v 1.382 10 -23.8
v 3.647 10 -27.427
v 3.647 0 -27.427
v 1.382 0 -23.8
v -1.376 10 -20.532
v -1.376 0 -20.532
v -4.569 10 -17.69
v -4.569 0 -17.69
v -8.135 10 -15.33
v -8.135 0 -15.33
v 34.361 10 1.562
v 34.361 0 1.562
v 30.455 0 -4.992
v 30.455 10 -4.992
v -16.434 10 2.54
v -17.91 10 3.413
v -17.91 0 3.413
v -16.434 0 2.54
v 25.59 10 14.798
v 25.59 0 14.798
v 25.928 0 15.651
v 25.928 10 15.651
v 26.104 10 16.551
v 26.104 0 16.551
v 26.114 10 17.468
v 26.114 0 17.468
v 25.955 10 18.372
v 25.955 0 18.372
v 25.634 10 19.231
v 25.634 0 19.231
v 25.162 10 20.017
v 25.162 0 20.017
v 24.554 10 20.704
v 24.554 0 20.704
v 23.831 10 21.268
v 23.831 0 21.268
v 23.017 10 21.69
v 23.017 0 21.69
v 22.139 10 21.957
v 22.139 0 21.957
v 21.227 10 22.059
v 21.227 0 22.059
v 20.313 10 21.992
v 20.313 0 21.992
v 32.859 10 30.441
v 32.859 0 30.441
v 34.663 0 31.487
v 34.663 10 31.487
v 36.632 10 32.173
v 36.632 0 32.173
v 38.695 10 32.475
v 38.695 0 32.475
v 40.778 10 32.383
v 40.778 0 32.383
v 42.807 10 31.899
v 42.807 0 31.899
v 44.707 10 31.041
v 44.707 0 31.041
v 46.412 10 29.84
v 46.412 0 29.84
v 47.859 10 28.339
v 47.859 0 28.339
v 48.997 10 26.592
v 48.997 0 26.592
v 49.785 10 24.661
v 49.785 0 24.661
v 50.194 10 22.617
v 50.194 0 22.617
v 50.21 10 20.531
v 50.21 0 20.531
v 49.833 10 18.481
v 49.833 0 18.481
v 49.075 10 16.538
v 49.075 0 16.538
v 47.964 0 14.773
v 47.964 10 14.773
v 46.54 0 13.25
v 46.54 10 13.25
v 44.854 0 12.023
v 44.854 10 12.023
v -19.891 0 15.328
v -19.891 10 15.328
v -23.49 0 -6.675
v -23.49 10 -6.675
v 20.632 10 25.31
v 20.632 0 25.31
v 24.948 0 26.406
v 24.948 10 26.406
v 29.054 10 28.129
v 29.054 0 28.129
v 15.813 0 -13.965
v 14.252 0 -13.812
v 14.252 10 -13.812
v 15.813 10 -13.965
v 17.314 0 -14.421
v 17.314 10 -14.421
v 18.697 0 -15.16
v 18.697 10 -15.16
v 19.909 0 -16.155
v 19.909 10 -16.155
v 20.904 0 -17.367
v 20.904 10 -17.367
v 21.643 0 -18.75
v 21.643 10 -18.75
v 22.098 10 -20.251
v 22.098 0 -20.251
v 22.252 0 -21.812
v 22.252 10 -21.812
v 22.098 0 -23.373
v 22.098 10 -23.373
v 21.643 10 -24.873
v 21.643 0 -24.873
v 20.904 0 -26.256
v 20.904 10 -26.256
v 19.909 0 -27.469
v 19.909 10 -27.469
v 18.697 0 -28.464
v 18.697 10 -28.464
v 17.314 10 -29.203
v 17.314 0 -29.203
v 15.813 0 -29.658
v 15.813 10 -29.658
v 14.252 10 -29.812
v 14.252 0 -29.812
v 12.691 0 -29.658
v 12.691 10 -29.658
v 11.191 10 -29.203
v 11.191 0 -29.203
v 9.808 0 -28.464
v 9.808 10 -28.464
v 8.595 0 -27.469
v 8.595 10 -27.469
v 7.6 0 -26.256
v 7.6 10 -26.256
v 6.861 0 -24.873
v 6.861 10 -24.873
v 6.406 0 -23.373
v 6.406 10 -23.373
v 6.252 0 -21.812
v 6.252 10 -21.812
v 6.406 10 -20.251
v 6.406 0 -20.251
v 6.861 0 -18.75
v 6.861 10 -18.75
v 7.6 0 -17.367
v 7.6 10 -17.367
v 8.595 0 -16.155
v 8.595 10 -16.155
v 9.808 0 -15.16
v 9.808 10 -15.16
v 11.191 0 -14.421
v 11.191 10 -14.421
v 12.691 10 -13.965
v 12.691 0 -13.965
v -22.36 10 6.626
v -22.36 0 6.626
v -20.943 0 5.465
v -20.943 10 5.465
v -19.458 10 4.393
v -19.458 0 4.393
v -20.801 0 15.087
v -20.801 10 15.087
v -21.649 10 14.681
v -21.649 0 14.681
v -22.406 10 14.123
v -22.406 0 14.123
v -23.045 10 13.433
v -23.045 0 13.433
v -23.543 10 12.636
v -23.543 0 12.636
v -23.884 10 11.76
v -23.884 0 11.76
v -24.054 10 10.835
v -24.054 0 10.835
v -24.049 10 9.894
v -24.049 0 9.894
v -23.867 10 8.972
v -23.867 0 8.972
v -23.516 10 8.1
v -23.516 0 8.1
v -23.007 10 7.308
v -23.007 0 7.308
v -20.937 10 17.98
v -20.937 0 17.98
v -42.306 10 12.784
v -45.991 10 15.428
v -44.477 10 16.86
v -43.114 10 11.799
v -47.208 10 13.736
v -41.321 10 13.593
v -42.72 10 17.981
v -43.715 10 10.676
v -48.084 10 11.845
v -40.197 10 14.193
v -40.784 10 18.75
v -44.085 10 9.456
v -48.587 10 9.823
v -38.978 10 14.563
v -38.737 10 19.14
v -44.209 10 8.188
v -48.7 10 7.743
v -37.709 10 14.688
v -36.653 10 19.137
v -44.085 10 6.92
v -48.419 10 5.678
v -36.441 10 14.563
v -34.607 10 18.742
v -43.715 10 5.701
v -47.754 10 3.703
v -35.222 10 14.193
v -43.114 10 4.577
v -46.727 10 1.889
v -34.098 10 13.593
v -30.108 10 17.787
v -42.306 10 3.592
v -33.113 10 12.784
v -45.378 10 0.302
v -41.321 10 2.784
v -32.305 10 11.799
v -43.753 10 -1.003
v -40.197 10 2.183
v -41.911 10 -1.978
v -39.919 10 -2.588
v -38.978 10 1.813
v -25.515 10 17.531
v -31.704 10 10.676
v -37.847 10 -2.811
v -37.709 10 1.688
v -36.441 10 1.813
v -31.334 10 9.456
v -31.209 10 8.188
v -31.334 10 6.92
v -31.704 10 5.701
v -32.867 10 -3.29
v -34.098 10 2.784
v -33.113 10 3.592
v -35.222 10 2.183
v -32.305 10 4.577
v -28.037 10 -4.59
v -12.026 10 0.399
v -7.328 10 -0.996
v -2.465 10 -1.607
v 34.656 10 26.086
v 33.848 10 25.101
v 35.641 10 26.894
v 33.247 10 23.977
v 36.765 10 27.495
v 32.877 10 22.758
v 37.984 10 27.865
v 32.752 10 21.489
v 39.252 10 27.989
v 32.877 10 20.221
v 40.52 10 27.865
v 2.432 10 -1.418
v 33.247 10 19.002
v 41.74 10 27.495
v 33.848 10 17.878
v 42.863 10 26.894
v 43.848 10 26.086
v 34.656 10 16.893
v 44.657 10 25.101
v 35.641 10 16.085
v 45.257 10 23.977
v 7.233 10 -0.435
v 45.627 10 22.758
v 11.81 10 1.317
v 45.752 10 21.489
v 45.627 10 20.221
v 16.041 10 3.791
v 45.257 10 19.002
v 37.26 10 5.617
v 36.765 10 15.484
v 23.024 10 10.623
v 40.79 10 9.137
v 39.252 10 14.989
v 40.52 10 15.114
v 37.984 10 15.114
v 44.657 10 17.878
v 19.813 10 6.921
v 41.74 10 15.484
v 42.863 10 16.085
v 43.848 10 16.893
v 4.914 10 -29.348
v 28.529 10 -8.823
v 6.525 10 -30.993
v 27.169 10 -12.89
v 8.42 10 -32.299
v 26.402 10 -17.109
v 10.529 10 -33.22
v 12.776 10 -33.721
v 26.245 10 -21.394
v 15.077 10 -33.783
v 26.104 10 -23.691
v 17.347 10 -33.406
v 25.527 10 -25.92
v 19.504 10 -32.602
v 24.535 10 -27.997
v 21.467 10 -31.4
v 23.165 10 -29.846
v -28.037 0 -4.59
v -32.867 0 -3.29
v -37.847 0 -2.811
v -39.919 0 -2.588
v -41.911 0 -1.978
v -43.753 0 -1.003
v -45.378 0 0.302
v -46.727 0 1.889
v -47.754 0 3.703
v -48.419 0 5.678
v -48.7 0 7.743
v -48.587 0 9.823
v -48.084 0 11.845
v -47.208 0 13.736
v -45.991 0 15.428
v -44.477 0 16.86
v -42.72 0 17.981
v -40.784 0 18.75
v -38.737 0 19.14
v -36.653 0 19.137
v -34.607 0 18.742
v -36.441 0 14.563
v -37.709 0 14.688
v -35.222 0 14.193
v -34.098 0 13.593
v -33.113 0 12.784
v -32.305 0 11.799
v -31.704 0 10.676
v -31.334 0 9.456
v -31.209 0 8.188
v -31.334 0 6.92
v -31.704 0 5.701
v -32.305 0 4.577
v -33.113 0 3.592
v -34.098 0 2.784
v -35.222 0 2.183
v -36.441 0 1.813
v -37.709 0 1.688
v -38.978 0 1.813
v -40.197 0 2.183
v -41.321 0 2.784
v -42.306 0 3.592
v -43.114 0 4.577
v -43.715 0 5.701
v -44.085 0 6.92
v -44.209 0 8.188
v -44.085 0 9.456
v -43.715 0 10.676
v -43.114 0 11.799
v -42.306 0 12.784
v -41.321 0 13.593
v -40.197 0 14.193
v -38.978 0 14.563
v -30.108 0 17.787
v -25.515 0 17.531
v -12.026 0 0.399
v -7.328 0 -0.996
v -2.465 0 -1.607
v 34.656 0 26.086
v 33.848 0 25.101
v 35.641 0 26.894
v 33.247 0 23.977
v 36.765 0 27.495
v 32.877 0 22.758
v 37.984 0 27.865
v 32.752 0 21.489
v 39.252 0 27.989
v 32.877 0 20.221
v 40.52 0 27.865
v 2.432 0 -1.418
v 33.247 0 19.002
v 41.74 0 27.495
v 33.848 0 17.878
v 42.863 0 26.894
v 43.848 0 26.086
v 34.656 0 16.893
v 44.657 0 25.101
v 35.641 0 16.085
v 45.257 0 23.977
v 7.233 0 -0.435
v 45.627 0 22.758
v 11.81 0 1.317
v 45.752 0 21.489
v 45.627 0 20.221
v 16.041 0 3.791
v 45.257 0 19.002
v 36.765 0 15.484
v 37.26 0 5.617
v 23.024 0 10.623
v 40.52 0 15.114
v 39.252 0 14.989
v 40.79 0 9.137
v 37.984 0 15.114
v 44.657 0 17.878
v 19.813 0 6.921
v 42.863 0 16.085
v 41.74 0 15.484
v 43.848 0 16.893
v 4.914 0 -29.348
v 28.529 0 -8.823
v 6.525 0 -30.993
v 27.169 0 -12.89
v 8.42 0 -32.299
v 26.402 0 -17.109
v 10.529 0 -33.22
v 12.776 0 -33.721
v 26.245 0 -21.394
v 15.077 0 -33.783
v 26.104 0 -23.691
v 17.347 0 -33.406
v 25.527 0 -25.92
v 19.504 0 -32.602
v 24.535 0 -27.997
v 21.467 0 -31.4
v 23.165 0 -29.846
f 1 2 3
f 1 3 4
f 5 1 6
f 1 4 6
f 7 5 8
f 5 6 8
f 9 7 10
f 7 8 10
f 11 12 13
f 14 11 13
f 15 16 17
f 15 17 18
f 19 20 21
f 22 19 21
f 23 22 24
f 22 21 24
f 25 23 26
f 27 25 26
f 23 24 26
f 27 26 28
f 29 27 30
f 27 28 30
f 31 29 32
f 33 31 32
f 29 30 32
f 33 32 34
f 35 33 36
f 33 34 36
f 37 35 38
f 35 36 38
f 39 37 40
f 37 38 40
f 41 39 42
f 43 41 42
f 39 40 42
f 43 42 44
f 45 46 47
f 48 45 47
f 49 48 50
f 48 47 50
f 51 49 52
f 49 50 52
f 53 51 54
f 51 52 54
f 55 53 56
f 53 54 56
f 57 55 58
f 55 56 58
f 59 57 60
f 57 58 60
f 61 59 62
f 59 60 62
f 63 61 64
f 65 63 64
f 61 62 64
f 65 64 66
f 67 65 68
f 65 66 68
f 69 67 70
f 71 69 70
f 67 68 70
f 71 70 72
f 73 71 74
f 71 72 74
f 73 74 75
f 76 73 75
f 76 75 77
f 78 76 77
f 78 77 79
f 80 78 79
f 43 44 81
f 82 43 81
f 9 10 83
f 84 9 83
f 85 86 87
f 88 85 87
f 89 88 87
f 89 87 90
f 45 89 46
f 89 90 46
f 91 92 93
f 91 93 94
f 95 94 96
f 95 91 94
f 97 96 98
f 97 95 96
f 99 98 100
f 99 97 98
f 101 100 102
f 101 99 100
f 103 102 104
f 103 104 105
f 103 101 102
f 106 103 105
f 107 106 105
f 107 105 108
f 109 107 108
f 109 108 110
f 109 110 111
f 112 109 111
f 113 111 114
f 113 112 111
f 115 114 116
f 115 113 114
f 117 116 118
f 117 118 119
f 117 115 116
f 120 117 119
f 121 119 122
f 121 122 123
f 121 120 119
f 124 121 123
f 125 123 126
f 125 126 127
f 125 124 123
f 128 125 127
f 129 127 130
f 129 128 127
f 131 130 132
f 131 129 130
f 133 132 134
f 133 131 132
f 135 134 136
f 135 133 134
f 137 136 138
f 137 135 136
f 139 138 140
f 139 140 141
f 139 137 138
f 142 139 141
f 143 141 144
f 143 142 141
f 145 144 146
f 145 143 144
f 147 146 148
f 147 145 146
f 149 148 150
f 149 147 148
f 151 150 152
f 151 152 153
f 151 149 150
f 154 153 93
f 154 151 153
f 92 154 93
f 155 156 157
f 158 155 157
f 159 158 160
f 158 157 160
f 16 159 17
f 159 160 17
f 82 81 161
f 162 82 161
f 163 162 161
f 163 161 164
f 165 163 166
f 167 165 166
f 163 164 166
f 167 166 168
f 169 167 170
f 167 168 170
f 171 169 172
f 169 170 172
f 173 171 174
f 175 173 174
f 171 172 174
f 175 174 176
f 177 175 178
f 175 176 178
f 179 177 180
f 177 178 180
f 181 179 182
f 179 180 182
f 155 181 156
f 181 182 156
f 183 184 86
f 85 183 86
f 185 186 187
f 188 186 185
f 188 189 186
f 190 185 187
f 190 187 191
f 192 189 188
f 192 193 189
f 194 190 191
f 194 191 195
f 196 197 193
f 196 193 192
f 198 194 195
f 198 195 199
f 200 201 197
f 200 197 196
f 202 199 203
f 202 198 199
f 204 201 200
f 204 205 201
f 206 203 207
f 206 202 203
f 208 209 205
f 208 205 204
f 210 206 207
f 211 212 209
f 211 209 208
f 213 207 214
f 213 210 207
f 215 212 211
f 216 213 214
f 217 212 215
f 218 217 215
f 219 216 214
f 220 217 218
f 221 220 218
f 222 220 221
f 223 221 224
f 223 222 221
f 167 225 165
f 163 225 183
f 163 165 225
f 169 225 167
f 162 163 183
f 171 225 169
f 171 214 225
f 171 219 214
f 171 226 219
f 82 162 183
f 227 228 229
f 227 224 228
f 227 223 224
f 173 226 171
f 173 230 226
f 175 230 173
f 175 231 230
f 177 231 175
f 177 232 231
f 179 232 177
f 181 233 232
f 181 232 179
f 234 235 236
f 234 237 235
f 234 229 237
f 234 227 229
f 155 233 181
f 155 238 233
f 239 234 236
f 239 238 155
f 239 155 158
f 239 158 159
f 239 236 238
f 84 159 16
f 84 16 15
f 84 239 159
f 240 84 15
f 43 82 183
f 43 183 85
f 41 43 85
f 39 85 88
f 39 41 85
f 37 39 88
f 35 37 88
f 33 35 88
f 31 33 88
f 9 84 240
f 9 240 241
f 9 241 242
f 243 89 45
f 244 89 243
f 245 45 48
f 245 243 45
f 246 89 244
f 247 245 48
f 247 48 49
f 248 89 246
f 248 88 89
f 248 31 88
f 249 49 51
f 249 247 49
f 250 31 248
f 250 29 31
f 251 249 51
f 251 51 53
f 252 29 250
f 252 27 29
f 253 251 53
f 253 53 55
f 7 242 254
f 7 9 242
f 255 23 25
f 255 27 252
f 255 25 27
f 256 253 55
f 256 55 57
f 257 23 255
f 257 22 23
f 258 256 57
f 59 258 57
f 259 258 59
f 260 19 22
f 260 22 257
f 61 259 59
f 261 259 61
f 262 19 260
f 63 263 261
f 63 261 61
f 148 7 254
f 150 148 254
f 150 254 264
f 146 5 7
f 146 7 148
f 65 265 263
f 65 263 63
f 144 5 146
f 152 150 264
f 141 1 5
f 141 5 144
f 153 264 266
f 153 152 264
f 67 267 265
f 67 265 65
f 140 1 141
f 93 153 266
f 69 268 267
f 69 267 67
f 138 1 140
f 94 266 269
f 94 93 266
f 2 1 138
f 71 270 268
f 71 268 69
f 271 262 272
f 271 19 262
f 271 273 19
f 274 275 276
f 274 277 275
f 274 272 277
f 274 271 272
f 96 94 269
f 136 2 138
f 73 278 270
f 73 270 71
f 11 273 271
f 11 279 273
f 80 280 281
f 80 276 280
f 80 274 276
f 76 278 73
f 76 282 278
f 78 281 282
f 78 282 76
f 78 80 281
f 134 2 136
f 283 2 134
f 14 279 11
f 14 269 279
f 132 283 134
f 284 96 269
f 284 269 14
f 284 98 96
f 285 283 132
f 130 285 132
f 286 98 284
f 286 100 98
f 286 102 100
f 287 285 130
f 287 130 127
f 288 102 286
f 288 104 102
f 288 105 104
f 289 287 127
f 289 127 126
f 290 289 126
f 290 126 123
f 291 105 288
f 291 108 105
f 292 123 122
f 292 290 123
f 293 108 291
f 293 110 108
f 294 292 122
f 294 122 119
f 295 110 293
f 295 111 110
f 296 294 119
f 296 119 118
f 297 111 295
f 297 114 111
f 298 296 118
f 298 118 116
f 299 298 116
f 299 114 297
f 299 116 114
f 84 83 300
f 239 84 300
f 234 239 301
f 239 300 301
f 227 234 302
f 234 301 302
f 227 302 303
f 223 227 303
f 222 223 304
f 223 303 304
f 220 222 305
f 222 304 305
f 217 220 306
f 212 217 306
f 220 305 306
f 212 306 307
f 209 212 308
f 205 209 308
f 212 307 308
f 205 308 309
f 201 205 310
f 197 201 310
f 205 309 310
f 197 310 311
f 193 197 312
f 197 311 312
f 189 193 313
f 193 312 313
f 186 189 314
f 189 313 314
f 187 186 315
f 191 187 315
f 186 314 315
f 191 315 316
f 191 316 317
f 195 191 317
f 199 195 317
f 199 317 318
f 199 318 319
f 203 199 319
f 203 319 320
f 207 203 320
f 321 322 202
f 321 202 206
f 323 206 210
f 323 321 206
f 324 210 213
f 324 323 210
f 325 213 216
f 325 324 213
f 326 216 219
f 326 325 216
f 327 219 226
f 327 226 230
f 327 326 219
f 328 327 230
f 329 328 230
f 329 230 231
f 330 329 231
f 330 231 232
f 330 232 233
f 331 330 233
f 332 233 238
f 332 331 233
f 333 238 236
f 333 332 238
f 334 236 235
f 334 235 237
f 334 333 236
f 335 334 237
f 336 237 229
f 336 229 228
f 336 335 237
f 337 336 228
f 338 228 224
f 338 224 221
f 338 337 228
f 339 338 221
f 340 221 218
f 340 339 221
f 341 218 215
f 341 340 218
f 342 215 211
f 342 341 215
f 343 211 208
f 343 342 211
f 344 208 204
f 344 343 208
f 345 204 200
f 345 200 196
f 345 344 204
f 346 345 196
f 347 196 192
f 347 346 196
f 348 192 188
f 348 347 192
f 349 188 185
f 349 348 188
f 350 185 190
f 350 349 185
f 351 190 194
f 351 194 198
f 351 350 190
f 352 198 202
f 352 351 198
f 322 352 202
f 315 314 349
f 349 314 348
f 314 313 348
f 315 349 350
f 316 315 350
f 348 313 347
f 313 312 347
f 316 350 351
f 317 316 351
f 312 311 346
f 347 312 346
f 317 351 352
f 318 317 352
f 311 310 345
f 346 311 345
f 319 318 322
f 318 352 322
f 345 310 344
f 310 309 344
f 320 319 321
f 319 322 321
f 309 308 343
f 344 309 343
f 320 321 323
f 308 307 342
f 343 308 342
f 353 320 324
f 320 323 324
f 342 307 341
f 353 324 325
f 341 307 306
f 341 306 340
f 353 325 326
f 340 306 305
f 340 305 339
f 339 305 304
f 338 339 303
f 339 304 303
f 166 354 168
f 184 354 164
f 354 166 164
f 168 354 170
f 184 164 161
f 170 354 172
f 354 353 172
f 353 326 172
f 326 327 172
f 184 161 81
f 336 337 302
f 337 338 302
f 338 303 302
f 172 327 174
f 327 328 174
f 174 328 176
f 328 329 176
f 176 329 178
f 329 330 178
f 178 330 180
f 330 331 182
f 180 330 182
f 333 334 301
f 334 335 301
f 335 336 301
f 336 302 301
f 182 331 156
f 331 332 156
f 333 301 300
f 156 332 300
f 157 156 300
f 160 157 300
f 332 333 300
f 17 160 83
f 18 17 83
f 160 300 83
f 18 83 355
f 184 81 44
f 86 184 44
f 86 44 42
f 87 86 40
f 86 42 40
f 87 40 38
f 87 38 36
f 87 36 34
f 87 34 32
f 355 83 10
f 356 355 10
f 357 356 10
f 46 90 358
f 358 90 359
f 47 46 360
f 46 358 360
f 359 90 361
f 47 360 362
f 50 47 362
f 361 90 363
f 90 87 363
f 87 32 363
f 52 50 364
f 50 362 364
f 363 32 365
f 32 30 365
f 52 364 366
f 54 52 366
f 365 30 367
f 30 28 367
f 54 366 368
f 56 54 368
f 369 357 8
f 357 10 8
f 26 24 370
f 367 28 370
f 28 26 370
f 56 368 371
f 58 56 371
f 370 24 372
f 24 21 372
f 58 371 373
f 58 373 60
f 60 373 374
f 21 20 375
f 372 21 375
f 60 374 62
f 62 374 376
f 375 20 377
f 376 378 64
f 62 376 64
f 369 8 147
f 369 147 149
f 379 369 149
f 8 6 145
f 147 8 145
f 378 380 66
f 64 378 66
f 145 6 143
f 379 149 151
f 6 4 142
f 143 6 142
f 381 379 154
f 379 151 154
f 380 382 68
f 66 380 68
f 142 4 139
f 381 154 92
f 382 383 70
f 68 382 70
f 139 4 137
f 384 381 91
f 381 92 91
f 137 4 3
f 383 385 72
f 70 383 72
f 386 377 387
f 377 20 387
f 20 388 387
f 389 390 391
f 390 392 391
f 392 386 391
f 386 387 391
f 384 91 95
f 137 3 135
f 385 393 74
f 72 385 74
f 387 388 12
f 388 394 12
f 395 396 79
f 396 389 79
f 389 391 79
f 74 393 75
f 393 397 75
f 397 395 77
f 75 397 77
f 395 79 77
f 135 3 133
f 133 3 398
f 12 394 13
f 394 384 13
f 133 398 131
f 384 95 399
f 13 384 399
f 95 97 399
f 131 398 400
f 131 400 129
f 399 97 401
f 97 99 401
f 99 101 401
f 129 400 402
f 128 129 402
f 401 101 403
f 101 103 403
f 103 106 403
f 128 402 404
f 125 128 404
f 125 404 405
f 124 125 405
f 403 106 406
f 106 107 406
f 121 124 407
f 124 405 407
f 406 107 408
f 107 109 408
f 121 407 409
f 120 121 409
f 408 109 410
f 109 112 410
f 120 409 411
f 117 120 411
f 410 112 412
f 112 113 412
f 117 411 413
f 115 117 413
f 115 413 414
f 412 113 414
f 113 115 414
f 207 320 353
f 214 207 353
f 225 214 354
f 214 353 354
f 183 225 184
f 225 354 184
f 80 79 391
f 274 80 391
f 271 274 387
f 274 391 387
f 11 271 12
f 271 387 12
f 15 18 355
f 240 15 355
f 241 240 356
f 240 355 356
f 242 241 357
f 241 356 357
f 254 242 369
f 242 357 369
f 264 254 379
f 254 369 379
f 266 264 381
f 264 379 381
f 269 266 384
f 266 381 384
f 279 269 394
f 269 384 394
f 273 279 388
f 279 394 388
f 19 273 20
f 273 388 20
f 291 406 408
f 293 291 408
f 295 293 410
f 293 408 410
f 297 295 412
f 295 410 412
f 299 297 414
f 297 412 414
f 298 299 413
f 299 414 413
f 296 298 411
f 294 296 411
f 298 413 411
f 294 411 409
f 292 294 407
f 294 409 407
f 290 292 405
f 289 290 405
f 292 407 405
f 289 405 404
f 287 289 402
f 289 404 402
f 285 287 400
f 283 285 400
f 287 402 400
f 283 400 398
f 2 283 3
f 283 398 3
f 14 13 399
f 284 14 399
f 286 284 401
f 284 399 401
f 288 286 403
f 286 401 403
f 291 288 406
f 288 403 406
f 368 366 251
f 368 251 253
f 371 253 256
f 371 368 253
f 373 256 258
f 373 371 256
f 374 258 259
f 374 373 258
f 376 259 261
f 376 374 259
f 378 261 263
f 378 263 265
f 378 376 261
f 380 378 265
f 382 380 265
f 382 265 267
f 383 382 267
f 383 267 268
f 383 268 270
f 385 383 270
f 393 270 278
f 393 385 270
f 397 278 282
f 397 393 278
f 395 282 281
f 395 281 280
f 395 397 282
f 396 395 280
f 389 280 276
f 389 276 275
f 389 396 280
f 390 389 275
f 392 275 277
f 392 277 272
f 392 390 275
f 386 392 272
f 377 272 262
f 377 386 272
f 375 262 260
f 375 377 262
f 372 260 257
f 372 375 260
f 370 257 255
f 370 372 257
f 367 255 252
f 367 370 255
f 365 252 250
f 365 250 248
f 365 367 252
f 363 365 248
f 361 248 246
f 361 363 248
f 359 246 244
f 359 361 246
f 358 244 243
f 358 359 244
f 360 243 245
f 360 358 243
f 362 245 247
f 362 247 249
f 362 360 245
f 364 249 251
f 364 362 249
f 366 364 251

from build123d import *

# Parameters (mm, degrees)
SKETCH1_R           = 6.5
SKETCH1_R_2         = 8
BOSS_EXTRUDE1_DEPTH = 10


with BuildPart() as part:
    # Sketch1 → Boss-Extrude1 (new body)
    with BuildSketch(Plane(origin=(0, 0, 0), x_dir=(1, 0, 0), z_dir=(0, 1, 0))):
        with BuildLine():
            Line((34.360854191, -1.561869431), (30.455482575, 4.991720076))
            ThreePointArc((30.455482575, 4.991720076), (27.168828712, 12.889530967), (26.244815541, 21.393865753))
            ThreePointArc((26.244815541, 21.393865753), (17.347223993, 33.405750066), (3.646755092, 27.426648798))
            ThreePointArc((3.646755092, 27.426648798), (-1.375508537, 20.532192172), (-8.135127404, 15.329864146))
            Line((-8.135127404, 15.329864146), (-23.489726911, 6.674621202))
            ThreePointArc((-23.489726911, 6.674621202), (-30.425083941, 3.839275852), (-37.846730781, 2.810918636))
            ThreePointArc((-37.846730781, 2.810918636), (-48.587233234, -9.823261281), (-34.60716777, -18.741706478))
            ThreePointArc((-34.60716777, -18.741706478), (-27.816143316, -17.570430421), (-20.937015372, -17.979697402))
            Line((-20.937015372, -17.979697402), (20.632426372, -25.309509119))
            ThreePointArc((20.632426372, -25.309509119), (27.032722198, -27.191241227), (32.858920246, -30.440874852))
            ThreePointArc((32.858920246, -30.440874852), (48.469635541, -27.492571895), (44.854019442, -12.022787068))
            ThreePointArc((44.854019442, -12.022787068), (38.951456853, -7.450330386), (34.360854191, -1.561869431))
        make_face()
        with Locations(Location((-37.709427644, -8.188224414, 0), (0, 0, 270))):
            Circle(SKETCH1_R, mode=Mode.SUBTRACT)
        with Locations(Location((14.252094878, 21.811778539, 0), (0, 0, 270))):
            Circle(SKETCH1_R_2, mode=Mode.SUBTRACT)
        with Locations(Location((39.252097338, -21.489490229, 0), (0, 0, 270))):
            Circle(SKETCH1_R, mode=Mode.SUBTRACT)
        with BuildLine():
            Line((20.312704962, -21.992225916), (-19.891412958, -15.327696302))
            ThreePointArc((-19.891412958, -15.327696302), (-23.883928025, -11.759574594), (-22.359792068, -6.626478193))
            ThreePointArc((-22.359792068, -6.626478193), (-20.208737863, -4.917702185), (-17.910389919, -3.41286121))
            Line((-17.910389919, -3.41286121), (-16.434238636, -2.540199474))
            ThreePointArc((-16.434238636, -2.540199474), (7.233462597, 0.434776311), (25.58991918, -14.798446076))
            ThreePointArc((25.58991918, -14.798446076), (25.161933747, -20.017004215), (20.312704962, -21.992225916))
        make_face(mode=Mode.SUBTRACT)
    extrude(amount=BOSS_EXTRUDE1_DEPTH)


solid = part.part
